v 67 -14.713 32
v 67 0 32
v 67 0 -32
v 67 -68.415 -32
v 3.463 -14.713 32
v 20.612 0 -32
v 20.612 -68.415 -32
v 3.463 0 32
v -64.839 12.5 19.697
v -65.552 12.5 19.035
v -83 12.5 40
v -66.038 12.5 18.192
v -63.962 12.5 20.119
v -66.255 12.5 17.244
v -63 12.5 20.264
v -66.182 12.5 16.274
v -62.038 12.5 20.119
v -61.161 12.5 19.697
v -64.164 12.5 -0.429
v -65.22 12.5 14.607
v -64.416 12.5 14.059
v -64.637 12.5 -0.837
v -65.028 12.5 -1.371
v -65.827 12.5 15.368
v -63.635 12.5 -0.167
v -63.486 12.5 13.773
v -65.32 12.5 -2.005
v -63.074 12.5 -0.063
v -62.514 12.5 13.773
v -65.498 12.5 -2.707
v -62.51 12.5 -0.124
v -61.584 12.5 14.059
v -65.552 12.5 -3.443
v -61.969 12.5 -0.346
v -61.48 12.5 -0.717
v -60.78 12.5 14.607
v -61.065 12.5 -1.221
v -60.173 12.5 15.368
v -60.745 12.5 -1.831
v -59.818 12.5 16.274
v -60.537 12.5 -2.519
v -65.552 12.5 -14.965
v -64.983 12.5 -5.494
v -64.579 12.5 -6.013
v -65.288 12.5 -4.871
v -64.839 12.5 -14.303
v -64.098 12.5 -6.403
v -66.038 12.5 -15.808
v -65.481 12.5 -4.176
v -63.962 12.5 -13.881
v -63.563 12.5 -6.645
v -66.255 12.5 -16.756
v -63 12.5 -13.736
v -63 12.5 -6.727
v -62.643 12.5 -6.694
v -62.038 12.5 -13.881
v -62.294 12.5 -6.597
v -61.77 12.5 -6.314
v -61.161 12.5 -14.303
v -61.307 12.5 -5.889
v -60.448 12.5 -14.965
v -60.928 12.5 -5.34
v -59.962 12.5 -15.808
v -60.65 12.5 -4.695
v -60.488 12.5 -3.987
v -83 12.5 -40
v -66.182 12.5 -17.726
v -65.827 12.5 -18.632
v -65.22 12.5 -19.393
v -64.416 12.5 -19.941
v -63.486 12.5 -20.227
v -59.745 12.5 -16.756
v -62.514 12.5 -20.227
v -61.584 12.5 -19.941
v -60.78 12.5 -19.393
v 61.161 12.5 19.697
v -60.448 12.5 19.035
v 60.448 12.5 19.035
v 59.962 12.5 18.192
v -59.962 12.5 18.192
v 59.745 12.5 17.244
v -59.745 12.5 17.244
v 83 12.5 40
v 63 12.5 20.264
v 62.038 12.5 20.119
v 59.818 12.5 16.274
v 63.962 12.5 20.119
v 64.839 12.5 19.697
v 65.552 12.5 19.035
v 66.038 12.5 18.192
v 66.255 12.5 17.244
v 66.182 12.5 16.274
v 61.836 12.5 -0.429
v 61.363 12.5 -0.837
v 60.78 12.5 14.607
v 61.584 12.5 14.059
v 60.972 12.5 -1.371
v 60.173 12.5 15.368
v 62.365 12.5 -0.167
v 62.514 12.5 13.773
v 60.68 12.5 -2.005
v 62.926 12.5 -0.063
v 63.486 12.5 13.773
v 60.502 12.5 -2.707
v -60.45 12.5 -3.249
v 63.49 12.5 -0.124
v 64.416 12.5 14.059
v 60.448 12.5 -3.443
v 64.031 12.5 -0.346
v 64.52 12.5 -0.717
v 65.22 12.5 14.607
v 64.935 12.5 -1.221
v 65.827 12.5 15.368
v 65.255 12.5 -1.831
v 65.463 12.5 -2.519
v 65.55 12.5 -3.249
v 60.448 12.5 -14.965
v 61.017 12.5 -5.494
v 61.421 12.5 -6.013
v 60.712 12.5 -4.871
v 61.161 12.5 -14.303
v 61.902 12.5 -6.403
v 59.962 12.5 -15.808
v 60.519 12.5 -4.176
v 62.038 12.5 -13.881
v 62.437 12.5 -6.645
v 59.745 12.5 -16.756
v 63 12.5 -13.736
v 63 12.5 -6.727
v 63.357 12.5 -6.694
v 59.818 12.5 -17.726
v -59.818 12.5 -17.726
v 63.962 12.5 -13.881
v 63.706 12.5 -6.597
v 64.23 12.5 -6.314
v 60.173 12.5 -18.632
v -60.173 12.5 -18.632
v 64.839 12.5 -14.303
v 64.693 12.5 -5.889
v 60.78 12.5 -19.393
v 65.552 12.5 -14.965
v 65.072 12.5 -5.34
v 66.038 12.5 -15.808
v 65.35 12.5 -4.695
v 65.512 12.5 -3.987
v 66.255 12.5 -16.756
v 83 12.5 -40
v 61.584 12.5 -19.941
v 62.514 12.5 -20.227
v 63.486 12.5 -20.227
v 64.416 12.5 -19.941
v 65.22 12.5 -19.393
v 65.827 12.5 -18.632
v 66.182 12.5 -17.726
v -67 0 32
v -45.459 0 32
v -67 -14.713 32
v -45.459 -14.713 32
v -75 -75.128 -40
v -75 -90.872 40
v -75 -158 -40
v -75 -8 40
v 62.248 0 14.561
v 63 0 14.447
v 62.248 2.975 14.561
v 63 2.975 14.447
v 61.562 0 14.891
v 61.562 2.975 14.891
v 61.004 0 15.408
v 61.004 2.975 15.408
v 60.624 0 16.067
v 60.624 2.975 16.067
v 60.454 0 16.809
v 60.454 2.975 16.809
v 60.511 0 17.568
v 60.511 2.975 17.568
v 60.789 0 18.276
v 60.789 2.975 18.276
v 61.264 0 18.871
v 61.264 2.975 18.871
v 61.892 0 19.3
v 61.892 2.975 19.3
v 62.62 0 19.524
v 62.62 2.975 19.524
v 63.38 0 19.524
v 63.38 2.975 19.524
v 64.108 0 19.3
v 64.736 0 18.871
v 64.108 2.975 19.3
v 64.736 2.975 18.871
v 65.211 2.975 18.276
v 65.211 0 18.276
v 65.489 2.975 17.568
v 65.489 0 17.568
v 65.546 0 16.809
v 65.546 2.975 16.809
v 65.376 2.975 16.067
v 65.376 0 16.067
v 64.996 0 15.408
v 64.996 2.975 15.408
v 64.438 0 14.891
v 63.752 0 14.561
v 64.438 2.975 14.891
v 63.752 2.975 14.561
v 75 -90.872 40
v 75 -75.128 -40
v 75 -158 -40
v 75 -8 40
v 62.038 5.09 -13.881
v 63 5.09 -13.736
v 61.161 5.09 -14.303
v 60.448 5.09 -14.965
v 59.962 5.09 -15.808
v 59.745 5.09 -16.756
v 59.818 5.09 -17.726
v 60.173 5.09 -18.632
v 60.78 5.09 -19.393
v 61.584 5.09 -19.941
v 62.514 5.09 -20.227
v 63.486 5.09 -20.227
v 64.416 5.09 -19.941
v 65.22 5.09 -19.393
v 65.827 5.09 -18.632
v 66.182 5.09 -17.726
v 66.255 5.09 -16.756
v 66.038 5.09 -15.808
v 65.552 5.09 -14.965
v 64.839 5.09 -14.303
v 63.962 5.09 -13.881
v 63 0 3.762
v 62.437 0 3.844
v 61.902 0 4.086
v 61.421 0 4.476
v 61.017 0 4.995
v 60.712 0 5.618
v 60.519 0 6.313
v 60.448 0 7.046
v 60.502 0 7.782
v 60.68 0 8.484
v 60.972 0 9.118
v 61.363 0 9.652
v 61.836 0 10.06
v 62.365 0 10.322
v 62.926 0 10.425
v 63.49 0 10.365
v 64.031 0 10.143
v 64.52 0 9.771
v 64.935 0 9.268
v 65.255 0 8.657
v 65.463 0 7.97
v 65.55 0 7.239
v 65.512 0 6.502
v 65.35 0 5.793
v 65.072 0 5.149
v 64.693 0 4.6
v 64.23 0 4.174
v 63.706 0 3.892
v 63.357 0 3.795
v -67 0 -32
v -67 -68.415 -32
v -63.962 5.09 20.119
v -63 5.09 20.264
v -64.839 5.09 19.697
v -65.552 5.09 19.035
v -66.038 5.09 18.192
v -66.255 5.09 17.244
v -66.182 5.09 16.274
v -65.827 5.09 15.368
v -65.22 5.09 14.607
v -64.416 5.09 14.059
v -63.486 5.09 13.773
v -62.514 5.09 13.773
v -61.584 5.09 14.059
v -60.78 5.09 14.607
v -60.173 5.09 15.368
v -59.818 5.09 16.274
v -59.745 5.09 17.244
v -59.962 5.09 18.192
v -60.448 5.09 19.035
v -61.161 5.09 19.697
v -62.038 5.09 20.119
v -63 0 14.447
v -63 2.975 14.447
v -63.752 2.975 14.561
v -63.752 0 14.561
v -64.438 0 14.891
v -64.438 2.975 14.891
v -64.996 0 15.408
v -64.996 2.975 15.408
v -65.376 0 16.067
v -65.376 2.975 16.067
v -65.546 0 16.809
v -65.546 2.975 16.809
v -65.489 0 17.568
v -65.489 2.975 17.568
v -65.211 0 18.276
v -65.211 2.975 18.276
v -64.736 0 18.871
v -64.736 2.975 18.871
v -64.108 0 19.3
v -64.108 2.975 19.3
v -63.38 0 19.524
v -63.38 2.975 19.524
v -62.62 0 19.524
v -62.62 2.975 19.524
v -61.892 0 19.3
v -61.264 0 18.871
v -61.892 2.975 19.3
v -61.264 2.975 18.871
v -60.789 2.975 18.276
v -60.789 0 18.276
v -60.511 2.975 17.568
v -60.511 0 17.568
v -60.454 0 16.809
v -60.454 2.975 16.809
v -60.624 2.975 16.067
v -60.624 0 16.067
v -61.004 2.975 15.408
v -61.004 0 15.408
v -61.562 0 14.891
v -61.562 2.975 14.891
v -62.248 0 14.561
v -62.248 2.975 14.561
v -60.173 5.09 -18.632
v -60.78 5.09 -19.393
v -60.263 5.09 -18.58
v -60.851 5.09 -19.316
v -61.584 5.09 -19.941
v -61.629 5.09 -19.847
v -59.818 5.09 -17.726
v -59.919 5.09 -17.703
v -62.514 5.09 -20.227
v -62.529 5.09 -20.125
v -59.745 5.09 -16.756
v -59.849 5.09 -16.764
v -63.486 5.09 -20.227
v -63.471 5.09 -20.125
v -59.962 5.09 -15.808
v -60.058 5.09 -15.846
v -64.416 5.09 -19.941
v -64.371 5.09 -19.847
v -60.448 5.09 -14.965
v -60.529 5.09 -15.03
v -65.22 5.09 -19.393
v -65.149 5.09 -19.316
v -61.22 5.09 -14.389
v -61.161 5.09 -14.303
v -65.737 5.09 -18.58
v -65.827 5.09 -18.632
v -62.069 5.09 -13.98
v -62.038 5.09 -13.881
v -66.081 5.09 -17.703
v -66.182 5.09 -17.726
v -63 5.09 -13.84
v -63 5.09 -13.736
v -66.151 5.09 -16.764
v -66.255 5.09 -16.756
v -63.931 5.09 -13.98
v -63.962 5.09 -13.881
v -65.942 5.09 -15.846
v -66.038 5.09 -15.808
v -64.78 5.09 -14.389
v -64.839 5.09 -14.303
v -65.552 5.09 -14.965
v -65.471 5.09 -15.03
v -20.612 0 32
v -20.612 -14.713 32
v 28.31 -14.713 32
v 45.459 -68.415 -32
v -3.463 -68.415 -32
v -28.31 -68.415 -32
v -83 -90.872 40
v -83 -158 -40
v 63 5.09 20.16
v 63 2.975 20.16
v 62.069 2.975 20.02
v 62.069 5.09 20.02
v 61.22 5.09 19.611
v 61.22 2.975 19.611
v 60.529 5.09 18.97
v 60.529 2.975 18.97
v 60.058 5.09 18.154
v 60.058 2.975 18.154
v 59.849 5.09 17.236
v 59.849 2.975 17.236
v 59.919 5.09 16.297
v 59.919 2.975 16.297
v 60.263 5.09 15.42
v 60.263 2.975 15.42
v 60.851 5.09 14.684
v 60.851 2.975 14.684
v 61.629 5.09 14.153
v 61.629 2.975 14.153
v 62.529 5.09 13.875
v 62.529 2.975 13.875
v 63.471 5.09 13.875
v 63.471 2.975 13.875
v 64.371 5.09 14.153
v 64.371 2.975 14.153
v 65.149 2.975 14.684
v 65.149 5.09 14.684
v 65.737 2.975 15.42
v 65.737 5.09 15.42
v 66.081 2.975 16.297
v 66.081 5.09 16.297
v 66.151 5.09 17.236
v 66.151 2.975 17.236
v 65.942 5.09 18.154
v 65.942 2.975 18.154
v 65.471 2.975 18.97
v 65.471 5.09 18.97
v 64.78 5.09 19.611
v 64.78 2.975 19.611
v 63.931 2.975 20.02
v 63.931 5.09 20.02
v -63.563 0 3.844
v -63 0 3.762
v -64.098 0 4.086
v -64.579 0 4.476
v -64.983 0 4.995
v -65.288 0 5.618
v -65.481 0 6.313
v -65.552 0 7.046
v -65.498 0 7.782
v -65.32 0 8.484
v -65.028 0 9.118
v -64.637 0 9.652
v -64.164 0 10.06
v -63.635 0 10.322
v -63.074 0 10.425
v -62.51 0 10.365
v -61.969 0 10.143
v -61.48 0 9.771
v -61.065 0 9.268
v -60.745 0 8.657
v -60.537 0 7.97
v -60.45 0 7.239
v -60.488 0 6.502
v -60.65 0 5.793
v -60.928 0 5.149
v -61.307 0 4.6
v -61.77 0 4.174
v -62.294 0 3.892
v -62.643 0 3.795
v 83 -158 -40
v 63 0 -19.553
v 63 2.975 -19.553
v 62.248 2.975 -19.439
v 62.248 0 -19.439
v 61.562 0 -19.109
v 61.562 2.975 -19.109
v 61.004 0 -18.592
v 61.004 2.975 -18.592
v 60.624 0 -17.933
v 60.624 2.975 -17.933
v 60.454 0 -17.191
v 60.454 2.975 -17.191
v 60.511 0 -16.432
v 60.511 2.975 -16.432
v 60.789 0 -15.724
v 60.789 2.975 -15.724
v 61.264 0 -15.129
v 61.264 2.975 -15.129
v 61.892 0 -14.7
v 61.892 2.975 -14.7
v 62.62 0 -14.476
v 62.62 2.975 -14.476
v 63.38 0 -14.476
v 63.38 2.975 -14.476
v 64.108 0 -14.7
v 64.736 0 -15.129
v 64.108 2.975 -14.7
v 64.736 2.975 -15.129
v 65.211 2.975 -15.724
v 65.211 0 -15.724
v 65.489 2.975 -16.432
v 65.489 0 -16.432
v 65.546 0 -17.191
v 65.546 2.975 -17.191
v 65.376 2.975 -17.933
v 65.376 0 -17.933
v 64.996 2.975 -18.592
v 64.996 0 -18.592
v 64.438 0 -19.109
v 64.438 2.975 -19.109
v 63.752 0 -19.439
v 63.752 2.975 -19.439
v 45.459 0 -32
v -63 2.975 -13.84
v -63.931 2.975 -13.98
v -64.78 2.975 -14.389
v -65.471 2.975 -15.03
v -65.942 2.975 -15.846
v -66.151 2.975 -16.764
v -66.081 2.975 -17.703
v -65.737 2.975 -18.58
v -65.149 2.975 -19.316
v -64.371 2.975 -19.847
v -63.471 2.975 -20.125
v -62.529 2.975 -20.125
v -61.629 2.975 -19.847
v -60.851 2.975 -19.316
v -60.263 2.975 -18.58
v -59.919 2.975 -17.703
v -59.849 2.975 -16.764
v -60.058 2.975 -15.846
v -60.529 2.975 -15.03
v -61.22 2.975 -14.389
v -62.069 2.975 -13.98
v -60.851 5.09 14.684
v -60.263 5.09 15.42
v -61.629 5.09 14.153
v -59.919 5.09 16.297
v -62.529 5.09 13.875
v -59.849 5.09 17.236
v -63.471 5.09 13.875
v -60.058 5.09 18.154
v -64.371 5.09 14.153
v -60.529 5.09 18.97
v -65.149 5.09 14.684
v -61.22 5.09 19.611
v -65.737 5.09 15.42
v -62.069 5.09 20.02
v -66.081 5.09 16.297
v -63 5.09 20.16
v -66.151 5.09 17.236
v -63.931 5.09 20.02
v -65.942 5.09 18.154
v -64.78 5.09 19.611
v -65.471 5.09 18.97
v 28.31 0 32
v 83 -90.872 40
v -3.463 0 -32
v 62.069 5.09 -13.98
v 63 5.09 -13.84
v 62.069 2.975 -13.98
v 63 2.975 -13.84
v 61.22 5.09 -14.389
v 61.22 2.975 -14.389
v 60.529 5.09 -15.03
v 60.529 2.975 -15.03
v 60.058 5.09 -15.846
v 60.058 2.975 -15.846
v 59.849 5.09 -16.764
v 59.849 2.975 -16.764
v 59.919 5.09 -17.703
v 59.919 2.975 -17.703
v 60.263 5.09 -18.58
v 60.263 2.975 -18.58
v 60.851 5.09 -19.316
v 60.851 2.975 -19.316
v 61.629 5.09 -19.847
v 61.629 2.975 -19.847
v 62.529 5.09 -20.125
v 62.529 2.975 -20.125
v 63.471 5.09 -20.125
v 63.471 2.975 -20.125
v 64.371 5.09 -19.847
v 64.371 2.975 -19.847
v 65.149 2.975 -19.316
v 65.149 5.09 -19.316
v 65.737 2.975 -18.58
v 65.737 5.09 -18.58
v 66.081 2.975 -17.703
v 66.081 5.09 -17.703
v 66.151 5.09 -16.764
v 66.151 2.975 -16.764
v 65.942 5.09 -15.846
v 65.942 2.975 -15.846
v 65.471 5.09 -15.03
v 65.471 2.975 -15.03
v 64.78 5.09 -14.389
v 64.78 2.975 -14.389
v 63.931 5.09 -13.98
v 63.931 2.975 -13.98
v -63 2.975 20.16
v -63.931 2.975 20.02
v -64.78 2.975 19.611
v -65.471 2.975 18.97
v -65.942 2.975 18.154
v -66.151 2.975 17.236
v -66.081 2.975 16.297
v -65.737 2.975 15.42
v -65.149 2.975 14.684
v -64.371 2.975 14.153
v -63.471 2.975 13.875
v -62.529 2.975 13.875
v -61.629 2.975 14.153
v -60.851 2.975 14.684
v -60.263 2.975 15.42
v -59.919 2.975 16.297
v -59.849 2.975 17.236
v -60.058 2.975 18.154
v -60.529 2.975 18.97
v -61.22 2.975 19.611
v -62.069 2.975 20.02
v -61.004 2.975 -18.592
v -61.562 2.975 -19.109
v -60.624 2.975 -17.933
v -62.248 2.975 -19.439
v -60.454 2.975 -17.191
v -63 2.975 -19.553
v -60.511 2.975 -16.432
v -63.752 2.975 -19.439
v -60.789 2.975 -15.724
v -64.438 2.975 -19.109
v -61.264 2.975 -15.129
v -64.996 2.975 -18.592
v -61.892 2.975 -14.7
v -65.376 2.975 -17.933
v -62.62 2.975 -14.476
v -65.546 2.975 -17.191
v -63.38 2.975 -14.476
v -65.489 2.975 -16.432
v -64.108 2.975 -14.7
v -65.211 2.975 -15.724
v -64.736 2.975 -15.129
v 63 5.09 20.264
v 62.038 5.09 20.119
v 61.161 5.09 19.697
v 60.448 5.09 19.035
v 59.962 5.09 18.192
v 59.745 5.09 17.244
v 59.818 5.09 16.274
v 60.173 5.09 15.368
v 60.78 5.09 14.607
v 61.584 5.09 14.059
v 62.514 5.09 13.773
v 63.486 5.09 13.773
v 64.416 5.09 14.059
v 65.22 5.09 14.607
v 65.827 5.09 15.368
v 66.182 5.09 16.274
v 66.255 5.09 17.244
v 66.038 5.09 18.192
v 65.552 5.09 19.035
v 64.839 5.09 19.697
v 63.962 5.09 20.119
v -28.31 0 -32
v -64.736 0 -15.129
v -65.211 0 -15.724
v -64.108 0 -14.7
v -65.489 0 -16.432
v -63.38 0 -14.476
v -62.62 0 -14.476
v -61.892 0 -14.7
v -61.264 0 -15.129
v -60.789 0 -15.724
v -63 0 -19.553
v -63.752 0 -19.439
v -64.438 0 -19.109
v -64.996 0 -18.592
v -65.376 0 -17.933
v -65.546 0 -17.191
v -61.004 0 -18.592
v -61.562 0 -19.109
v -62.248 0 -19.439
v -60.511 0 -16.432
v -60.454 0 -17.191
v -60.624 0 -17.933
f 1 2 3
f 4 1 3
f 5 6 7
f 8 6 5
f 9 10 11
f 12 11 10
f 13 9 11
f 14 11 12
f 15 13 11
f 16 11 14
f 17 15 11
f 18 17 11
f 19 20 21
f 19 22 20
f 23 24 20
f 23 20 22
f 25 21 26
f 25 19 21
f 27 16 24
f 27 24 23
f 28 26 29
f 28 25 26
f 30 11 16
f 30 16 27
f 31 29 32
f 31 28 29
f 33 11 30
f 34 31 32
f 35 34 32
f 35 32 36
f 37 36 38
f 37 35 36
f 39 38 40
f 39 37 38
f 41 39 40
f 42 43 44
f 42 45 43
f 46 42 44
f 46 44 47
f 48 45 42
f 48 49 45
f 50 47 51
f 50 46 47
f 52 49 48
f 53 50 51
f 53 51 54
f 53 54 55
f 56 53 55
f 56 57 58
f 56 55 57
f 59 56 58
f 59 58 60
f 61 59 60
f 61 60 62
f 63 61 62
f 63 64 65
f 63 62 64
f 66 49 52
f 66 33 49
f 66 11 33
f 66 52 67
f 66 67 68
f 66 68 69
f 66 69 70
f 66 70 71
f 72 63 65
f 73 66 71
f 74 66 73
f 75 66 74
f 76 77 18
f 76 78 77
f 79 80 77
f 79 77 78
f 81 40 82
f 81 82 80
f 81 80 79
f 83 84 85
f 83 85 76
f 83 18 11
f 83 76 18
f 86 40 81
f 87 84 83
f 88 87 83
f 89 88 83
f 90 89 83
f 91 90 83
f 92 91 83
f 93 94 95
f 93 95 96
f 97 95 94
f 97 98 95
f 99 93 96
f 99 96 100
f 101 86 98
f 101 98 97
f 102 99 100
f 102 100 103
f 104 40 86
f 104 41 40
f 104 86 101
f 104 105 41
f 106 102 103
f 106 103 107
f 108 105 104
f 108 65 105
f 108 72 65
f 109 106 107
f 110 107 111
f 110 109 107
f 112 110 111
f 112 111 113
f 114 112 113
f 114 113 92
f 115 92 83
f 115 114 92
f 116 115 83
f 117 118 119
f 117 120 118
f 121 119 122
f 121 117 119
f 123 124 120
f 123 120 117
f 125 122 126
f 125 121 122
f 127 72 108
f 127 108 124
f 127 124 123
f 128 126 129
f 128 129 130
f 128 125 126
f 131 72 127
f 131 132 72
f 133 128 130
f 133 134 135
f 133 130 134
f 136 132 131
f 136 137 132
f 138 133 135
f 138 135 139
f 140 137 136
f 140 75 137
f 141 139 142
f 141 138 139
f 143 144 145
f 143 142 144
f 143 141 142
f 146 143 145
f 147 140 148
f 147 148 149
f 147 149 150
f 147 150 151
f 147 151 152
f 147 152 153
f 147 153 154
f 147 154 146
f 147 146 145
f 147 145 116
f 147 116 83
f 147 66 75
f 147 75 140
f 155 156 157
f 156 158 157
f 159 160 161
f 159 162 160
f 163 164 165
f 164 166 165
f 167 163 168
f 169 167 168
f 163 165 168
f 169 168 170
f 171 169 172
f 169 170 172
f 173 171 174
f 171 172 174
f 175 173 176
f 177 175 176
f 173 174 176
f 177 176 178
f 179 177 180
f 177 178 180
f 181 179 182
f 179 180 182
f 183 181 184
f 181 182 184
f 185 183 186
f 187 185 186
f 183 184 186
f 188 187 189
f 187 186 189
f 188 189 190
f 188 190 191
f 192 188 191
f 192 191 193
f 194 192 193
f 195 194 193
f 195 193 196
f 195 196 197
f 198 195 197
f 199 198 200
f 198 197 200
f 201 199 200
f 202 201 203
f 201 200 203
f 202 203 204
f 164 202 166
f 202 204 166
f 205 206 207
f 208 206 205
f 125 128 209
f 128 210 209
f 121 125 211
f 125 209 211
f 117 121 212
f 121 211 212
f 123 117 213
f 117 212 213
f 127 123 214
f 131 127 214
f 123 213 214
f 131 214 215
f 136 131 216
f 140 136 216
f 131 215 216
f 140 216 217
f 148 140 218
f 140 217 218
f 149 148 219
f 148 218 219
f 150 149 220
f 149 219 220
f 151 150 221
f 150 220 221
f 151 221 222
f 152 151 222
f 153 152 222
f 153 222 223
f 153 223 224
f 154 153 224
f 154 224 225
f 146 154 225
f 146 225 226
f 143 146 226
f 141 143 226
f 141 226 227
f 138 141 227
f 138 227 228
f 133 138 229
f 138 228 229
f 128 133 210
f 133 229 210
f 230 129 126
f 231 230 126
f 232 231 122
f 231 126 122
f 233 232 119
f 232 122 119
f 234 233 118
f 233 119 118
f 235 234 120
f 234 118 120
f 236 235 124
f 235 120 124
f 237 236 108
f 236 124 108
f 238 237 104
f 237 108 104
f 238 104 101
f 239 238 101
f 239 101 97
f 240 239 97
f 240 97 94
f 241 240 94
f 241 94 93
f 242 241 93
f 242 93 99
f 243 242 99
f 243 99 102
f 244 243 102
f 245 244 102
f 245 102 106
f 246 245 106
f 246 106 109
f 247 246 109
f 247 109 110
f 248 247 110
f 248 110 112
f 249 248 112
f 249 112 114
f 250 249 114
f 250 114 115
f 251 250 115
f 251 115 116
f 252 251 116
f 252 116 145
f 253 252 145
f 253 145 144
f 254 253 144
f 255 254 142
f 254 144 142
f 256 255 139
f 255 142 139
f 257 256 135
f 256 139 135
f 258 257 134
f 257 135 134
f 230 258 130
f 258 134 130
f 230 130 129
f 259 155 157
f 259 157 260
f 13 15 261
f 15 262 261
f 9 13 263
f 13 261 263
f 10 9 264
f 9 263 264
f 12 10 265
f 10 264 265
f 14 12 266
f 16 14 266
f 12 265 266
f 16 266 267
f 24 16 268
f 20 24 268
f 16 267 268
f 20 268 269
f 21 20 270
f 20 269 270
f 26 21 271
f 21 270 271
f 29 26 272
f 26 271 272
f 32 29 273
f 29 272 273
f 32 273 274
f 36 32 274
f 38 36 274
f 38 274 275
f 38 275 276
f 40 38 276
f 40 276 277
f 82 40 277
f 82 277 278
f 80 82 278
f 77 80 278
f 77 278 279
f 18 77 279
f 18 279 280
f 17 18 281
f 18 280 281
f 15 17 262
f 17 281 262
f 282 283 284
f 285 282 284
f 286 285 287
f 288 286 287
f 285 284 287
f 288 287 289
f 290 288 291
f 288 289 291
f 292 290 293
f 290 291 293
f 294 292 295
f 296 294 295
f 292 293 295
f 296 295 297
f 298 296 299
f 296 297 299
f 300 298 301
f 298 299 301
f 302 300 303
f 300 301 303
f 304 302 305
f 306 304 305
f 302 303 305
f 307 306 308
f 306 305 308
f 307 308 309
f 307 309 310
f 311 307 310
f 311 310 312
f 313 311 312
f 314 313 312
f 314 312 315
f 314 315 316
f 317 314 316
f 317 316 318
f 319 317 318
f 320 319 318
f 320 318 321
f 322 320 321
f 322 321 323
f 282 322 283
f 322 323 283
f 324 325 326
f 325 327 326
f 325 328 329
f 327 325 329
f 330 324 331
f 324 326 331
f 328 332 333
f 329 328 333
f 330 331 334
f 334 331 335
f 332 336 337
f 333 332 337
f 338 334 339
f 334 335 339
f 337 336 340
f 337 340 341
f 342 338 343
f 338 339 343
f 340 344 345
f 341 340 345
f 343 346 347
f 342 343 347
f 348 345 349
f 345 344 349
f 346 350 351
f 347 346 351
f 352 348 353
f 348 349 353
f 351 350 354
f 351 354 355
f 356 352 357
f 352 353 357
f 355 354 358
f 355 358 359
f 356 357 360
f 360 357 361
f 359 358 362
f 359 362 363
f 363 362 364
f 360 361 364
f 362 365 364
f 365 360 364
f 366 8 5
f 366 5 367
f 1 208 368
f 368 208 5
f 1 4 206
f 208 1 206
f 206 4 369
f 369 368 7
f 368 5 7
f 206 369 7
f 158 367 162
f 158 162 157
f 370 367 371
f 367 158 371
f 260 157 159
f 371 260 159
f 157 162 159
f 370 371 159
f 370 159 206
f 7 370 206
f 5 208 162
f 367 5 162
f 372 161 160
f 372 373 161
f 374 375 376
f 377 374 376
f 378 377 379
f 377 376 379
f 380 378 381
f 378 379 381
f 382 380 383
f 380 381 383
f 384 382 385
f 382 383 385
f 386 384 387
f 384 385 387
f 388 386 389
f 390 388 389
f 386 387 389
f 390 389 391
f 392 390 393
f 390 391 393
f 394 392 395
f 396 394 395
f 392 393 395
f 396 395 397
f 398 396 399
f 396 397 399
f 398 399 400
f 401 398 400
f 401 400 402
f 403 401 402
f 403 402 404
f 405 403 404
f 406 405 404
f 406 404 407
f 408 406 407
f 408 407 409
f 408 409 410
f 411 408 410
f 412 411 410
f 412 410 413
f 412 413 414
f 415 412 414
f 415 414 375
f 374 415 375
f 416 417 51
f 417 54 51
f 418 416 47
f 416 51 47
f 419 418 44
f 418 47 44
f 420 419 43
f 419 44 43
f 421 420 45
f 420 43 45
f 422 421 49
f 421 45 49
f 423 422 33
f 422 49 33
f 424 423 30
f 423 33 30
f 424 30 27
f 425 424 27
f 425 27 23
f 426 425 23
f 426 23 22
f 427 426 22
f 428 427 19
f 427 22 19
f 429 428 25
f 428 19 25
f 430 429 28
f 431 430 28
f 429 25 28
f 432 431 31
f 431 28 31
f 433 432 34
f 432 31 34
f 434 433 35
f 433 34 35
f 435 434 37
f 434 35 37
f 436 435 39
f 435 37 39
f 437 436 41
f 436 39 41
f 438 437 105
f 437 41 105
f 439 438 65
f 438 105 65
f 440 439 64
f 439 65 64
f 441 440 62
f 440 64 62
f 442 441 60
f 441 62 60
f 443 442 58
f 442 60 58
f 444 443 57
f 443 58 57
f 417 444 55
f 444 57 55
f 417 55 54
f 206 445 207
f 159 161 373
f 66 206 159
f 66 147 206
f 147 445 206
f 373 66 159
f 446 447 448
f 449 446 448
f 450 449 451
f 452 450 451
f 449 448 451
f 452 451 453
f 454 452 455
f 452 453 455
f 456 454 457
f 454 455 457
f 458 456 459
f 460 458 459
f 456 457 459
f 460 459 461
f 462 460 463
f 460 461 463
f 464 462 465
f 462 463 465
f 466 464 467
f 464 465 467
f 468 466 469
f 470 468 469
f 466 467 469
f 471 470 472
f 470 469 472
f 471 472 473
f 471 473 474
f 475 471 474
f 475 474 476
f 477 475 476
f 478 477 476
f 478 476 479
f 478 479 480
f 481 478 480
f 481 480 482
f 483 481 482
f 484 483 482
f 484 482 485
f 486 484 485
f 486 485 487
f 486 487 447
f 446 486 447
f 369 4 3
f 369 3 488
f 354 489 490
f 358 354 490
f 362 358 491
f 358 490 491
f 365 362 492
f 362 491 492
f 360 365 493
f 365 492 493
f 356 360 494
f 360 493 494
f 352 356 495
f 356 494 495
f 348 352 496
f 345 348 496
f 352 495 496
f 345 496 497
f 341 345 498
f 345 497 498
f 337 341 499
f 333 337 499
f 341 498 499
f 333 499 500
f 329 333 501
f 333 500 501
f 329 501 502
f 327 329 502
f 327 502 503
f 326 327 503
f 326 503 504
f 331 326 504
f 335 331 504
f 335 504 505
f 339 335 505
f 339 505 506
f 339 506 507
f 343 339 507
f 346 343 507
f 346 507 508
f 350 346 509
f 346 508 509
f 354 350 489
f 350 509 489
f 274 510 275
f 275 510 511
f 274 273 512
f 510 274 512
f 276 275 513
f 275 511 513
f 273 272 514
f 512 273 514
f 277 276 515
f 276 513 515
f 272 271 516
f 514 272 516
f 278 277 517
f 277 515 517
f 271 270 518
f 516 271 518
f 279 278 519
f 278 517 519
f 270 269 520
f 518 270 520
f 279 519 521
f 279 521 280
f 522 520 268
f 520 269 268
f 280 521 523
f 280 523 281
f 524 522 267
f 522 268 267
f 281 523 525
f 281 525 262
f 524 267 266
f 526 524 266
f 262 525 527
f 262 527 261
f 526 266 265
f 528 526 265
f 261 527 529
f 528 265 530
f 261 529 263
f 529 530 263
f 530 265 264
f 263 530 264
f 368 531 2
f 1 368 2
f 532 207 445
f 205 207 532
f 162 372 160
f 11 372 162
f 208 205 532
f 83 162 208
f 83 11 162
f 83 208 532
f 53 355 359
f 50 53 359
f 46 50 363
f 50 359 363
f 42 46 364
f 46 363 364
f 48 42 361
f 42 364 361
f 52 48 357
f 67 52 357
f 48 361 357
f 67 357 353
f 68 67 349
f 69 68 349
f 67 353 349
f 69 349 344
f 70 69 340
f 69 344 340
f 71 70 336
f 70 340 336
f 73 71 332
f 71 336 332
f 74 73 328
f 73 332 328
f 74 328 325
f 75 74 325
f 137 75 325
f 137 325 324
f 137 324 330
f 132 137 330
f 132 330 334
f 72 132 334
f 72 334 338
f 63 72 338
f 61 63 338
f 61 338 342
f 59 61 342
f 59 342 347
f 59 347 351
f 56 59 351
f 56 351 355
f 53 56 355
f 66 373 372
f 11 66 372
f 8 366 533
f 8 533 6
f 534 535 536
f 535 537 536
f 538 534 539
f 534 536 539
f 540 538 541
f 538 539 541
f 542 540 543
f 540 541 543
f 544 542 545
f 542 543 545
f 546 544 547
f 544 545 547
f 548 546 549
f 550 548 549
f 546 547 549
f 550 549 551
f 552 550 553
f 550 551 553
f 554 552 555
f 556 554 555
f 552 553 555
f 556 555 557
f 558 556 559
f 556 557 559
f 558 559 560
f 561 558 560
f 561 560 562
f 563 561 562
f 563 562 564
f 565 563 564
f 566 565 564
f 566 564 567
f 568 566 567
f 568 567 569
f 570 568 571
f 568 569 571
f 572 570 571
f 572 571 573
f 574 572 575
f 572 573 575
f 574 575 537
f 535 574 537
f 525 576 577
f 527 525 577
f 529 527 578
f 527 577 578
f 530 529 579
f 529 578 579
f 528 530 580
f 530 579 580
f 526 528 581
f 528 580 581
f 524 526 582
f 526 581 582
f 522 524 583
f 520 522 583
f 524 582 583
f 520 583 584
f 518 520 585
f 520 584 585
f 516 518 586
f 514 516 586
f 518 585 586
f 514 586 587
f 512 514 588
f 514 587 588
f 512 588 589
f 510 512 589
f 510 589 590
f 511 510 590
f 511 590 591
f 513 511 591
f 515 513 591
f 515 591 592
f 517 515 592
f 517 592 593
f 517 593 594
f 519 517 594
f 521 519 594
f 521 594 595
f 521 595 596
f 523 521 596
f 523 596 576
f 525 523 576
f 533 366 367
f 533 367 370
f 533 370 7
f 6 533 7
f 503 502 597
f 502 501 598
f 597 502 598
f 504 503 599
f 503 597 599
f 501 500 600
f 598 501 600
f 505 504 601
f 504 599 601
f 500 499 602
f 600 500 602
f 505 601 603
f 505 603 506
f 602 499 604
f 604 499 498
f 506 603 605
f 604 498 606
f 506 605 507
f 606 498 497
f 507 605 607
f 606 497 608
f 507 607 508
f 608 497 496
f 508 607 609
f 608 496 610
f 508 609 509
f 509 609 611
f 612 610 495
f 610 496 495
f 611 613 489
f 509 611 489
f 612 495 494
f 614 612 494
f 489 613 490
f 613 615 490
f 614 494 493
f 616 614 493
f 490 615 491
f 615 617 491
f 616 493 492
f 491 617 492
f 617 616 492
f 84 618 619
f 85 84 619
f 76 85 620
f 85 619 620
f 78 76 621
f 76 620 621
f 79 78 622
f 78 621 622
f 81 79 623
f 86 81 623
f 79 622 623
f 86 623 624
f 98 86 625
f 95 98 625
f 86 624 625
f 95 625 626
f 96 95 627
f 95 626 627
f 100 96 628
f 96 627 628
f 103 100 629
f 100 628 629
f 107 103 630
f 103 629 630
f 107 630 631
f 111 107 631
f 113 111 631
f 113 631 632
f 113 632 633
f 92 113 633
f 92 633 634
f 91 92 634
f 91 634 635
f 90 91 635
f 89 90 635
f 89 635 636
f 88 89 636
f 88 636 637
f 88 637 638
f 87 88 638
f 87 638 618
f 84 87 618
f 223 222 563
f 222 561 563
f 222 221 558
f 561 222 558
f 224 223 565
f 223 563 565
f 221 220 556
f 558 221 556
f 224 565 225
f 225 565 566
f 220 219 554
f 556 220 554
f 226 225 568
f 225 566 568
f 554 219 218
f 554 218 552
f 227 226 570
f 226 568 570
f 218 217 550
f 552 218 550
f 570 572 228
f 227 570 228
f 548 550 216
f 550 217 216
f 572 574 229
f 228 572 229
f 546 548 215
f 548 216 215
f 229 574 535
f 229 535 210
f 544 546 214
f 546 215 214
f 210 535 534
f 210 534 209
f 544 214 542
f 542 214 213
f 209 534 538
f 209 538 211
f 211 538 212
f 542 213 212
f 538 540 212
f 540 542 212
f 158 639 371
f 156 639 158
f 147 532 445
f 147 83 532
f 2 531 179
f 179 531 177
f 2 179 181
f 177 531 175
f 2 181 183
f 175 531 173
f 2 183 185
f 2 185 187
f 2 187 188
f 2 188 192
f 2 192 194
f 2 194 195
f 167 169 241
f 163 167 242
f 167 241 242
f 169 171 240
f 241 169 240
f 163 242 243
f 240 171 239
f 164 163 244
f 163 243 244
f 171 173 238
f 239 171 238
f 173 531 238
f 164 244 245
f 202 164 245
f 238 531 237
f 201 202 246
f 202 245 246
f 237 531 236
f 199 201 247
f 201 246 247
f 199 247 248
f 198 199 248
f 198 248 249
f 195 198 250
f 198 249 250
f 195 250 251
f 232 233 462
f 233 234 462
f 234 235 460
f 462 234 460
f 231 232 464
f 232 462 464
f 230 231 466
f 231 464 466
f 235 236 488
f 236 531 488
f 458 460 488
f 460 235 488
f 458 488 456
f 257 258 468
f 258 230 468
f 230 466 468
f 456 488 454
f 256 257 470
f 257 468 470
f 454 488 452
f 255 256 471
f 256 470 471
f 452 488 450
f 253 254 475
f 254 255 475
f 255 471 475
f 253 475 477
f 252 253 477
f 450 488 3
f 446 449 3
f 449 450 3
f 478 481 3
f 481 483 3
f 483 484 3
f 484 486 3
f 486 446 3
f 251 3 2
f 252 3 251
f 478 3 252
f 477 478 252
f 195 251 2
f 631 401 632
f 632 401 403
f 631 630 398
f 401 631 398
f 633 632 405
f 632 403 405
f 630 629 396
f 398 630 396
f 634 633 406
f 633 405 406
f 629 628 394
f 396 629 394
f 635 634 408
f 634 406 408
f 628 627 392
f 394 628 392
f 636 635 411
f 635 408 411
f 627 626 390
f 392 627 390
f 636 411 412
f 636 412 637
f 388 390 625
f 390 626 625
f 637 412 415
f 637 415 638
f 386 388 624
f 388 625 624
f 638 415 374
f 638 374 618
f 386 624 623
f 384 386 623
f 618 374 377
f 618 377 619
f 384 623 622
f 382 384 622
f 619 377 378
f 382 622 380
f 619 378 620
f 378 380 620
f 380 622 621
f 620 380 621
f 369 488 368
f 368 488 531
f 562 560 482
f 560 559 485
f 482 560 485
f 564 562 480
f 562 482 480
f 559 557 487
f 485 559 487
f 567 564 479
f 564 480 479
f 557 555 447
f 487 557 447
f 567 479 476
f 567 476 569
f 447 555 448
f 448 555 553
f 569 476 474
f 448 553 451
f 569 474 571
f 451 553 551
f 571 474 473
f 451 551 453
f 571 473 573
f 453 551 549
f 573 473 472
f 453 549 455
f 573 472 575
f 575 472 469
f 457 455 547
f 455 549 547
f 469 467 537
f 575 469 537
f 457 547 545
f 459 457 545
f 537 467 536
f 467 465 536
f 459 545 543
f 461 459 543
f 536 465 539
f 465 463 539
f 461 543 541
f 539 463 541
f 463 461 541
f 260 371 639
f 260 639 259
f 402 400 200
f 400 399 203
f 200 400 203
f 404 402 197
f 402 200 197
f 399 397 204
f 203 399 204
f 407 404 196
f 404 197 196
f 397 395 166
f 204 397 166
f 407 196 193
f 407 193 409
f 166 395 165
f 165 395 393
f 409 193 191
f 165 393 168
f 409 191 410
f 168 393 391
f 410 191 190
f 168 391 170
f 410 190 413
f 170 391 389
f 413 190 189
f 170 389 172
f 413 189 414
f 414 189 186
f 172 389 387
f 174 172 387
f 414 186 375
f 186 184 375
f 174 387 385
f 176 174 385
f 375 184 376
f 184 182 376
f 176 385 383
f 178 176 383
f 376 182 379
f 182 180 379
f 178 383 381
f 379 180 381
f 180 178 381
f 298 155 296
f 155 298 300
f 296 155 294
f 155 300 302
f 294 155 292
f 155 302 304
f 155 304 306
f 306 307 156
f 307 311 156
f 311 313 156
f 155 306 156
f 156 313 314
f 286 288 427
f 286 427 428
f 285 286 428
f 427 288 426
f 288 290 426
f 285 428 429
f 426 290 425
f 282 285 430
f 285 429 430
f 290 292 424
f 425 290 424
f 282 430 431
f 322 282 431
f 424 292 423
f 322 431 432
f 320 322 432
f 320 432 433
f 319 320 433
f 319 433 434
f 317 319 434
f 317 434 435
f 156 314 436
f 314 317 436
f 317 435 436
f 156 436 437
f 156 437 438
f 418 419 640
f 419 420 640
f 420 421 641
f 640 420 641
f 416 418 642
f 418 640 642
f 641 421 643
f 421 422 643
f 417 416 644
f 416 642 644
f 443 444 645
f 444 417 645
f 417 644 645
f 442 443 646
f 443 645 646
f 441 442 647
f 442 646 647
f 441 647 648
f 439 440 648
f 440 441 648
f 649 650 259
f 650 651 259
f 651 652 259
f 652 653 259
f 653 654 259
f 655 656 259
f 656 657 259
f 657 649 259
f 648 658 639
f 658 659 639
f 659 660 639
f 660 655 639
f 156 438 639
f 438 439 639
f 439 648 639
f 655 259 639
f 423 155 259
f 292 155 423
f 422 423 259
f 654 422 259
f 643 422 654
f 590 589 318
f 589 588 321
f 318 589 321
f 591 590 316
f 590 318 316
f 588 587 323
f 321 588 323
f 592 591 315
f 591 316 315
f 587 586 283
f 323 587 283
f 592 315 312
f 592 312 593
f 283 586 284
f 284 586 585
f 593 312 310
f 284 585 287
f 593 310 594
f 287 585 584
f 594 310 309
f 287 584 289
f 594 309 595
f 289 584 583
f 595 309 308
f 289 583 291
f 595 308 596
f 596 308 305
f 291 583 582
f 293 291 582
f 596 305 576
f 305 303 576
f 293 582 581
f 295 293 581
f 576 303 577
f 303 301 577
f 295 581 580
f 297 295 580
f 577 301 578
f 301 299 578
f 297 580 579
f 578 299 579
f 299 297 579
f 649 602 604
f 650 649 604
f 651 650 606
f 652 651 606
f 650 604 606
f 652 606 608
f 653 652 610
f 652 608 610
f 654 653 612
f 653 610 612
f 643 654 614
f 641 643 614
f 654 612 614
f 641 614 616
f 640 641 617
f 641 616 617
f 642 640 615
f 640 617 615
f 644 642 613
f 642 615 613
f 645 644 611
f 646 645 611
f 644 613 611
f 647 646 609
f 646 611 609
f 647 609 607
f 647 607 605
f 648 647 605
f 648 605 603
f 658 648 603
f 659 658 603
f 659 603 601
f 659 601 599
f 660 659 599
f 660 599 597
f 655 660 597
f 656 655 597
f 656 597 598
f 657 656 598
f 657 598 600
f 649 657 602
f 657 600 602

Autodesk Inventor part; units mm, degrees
ref_plane "XZ Plane" through (0, 0, 0) normal (0, 1, 0) x (-1, 0, 0)
ref_plane "XY Plane" through (0, 0, 0) normal (0, 0, 1) x (1, 0, 0)
sketch "Sketch8" plane through (0, 0, 0) normal (0, 1, 0) x (-1, 0, 0)
  line L0 (83, 40) -> (-83, 40)
  line L1 (-83, 40) -> (-83, -40)
  line L2 (-83, -40) -> (83, -40)
  line L3 (83, -40) -> (83, 40)
  line L4 (83, 40) -> (-83, -40) construction
  line L5 (-83, 40) -> (83, -40) construction
  point P0 (0, 0)
  dimension "d28" = 80
  dimension "d29" = 166
extrude "Extrusion8" add sketch "Sketch8" against normal blind 8
sketch "Sketch9" plane through (0, -8, 0) normal (0, -1, 0) x (1, 0, 0)
  line L0 (83, 40) -> (-83, 40) projected
  line L1 (-83, -40) -> (83, -40) projected
  line L2 (-83, 40) -> (-75, 40)
  line L3 (-75, 40) -> (-75, -40)
  line L4 (-75, -40) -> (-83, -40)
  line L5 (-83, -40) -> (-83, 40)
  line L6 (83, -40) -> (83, 40) projected
  line L7 (83, -40) -> (75, -40)
  line L8 (75, -40) -> (75, 40)
  line L9 (75, 40) -> (83, 40)
  line L10 (83, 40) -> (83, -40)
  point P0 (0, 0)
  point P1 (75, 40)
  point P2 (75, -40)
  dimension "d32" = 8
  dimension "d33" = 8
extrude "armsForCameraCase" add sketch "Sketch9" along normal blind 150 contours L6 L1 L8 L0 | L3 L1 L5 L0
sketch "Sketch10" plane through (-75, -8, 40) normal (1, 0, 0) x (0, 0, -1)
  line L0 (0, 0) -> (80, 0) projected
  line L1 (80, 0) -> (80, -150) projected
  line L2 (80, -150) -> (0, -150) projected
  line L3 (0, 0) -> (0, -150) projected
  line L4 (0, 0) -> (80, -67.128)
  line L5 (80, -67.128) -> (80, 0)
  line L6 (80, 0) -> (0, 0)
  point P0 (40, 8)
  point P1 (40, -33.564)
  dimension "d48" = 40
extrude "Extrusion10" add sketch "Sketch10" along normal up to surface (150 mm away) contours L0 L1 L4
sketch "Sketch11" plane through (0, 0, 0) normal (0, 1, 0) x (1, 0, 0)
  line L0 (83, 40) -> (-83, 40) projected
  line L1 (-83, -40) -> (83, -40) projected
  line L2 (-83, 40) -> (-83, -40) projected
  line L3 (83, -40) -> (83, 40) projected
  line L4 (-31.038, -40) -> (-9.602, 40)
  line L5 (-9.602, 40) -> (-17.8842, 40)
  line L6 (-75, 40) -> (75, 40) projected
  line L7 (-17.8842, 40) -> (-39.3202, -40)
  line L8 (-39.3202, -40) -> (-31.038, -40)
  line L9 (-31.038, -40) -> (-31.038, 40) construction
  line L10 (0, -40) -> (0, 40) construction
  line L11 (9.602, -40) -> (31.038, 40)
  line L12 (31.038, 40) -> (39.3202, 40)
  line L13 (39.3202, 40) -> (17.8842, -40)
  line L14 (17.8842, -40) -> (9.602, -40)
  point P0 (0, 0)
  point P1 (0, -40)
  point P2 (0, -40)
  point P3 (-20.32, 0)
  point P4 (0, 0)
  point P5 (20.32, 0)
  point P6 (39.3202, 40)
  point P7 (31.038, 40)
  point P8 (-17.8842, 40)
  dimension "d39" = -15
  dimension "d40" = 8
  dimension "d42" = 8
  dimension "d44" = 20.32
  dimension "d45" = 20.32
extrude "Extrusion11" add sketch "Sketch11" along normal blind 104.1375 contours L13 L1 L11 L0 | L4 L1 L7 L0
sketch "Sketch12" plane through (0, 0, 0) normal (0, 1, 0) x (1, 0, 0)
  line L0 (31.038, 40) -> (-9.602, 40) projected
  line L1 (31.038, 40) -> (9.602, -40) projected
  line L2 (-31.038, -40) -> (9.602, -40) projected
  line L3 (-31.038, -40) -> (-9.602, 40) projected
  line L4 (-9.602, 40) -> (31.038, 40)
  line L5 (31.038, 40) -> (9.602, -40)
  line L6 (9.602, -40) -> (-31.038, -40)
  line L7 (-9.602, 40) -> (-31.038, -40) projected
  line L8 (-31.038, -40) -> (-9.602, 40)
  point P0 (0, 0)
extrude "Extrusion12" add sketch "Sketch12" along normal blind 20
sketch "Sketch13" plane through (-83, 0, -40) normal (-1, 0, 0) x (0, 0, 1)
  line L0 (0, -75.128) -> (80, -8) projected
  line L1 (80, 0) -> (80, -158) projected
  line L2 (80, -158) -> (0, -158) projected
  line L3 (0, 0) -> (0, -158) projected
  line L4 (80, -158) -> (0, -158) construction
  line L5 (40, -158) -> (40, -41.564) construction
  line L6 (80, -8) -> (0, -75.128) construction
  line L7 (0, -205.6687) -> (80, -138.5407) construction
  line L8 (80, -8) -> (80, -158) construction
  point P0 (40, 0)
  point P1 (40, -172.1047)
  point P2 (20, -188.8867)
  point P3 (60, -155.3227)
  dimension "centerForTwoHoles" = 26.1081
  dimension "d51" = 100
  dimension "diagonalLine" = 104.4326
  dimension "d62" = 26.1081
  dimension "d63" = 26.1081
hole "HolesForAttchingToLowerCase" at (-83, -172.1047, 0) at (-83, -188.8867, -20) at (-83, -155.3227, 20) direction (1, 0, 0) diameter 6.7564 end through all clearance for "Hex Machine Screw" size "1/4" standard "Ansi Unified Screw Threads"
sketch "Sketch14" plane through (-83, 0, -40) normal (-1, 0, 0) x (0, 0, 1)
  line L0 (80, 0) -> (80, -158) projected
  line L1 (80, -158) -> (0, -158) projected
  line L2 (0, 0) -> (0, -158) projected
  line L3 (0, -75.128) -> (80, -8) projected
  line L4 (0, -75.128) -> (0, -158) projected
  line L5 (0, -158) -> (80, -90.872)
  line L6 (0, -158) -> (80, -158) projected
  line L7 (0, -158) -> (80, -158)
  line L8 (80, -158) -> (80, -90.872)
  point P0 (40, 0)
extrude "Extrusion13" cut sketch "Sketch14" against normal through all contours L0 L1 L5
sketch "Sketch15" plane through (-39.3202, 0, 40) normal (-0.9659258, 0, -0.258819) x (-0.258819, 0, 0.9659258)
  line L0 (-82.8221, 104.1375) -> (0, 104.1375) projected
  line L1 (0, 0) -> (0, 104.1375) projected
  line L2 (-82.8221, 0) -> (-82.8221, 104.1375) projected
  line L3 (-2.1436, 20) -> (-84.9657, 20) projected
  line L4 (-82.8221, 40) -> (0, 40) construction
  line L5 (-57.8221, 40) -> (-57.8221, 104.1375) construction
  point P0 (-48.8138, 0)
  point P1 (-82.8221, 52.0688)
  point P2 (-37.8221, 40)
  point P3 (-17.8221, 40)
  point P4 (-57.8221, 60)
  point P5 (-37.8221, 60)
  point P6 (-17.8221, 60)
  point P7 (-57.8221, 80)
  point P8 (-37.8221, 80)
  point P9 (-17.8221, 80)
  dimension "d64" = 25
  dimension "d74" = 20
  dimension "d77" = 20
  dimension "d90" = 20
hole "HoleForLeftSideOf2x4" at (-24.3547, 40, -15.8519) at (-29.5311, 40, 3.4667) at (-34.7075, 40, 22.7852) at (-29.5311, 60, 3.4667) at (-24.3547, 60, -15.8519) at (-34.7075, 60, 22.7852) at (-34.7075, 80, 22.7852) at (-29.5311, 80, 3.4667) at (-24.3547, 80, -15.8519) direction (0.9659258, 0, 0.258819) diameter 4.496 depth 8 countersink diameter 8.433 countersink angle 82 clearance for "Flat Head Machine Screw (82)" size "#8" standard "Ansi Unified Screw Threads"
sketch "Sketch16" plane through (39.3202, 0, -40) normal (0.9659258, 0, 0.258819) x (0.258819, 0, -0.9659258)
  line L0 (-82.8221, 104.1375) -> (0, 104.1375) projected
  line L1 (0, 0) -> (0, 104.1375) projected
  line L2 (-82.8221, 0) -> (-82.8221, 104.1375) projected
  line L3 (-82.8221, 0) -> (-65.9689, 0) projected
  line L4 (-2.1436, 20) -> (-84.9657, 20) projected
  line L5 (-82.8221, 40) -> (0, 40) construction
  line L6 (-67.8221, 40) -> (-67.8221, 104.1375) construction
  point P0 (-48.8138, 0)
  point P1 (-47.8221, 40)
  point P2 (-27.8221, 40)
  point P3 (-67.8221, 60)
  point P4 (-47.8221, 60)
  point P5 (-27.8221, 60)
  point P6 (-67.8221, 80)
  point P7 (-47.8221, 80)
  point P8 (-27.8221, 80)
  dimension "d80" = 20
  dimension "d81" = 15
  dimension "d84" = 20
  dimension "d87" = 20
hole "HolesForRightSideOf2x4" at (26.9429, 40, 6.1926) at (32.1193, 40, -13.1259) at (21.7665, 60, 25.5111) at (26.9429, 60, 6.1926) at (32.1193, 60, -13.1259) at (21.7665, 80, 25.5111) at (26.9429, 80, 6.1926) at (32.1193, 80, -13.1259) at (21.7665, 40, 25.5111) direction (-0.9659258, 0, -0.258819) diameter 4.496 depth 8 countersink diameter 8.433 countersink angle 82 clearance for "Flat Head Machine Screw (82)" size "#8" standard "Ansi Unified Screw Threads"
sketch "Sketch17" plane through (0, 20, 0) normal (0, 1, 0) x (1, 0, 0)
  line L0 (31.038, 40) -> (9.602, -40) projected
  line L1 (-31.038, -40) -> (9.602, -40) projected
  line L2 (-31.038, -40) -> (-9.602, 40) projected
  line L3 (31.038, 40) -> (-9.602, 40) projected
  line L4 (20.6122, 32) -> (3.4634, -32)
  line L5 (3.4634, -32) -> (-20.6122, -32)
  line L6 (-20.6122, -32) -> (-3.4634, 32)
  line L7 (-3.4634, 32) -> (20.6122, 32)
  point P0 (0, 0)
  point P1 (10.718, 40)
  point P2 (-8.5744, -32)
  dimension "d98" = 8
  dimension "d99" = 8
  dimension "d101" = 8
  dimension "d102" = 8
extrude "Extrusion14" cut sketch "Sketch17" against normal through all contours L4 L5 L6 L7
sketch "Sketch18" plane through (0, 0, 0) normal (0, 1, 0) x (1, 0, 0)
  line L0 (17.8842, -40) -> (83, -40) projected
  line L1 (17.8842, -40) -> (39.3202, 40) projected
  line L2 (83, 40) -> (39.3202, 40) projected
  line L3 (83, -40) -> (83, 40) projected
  line L4 (67, -32) -> (67, 32)
  line L5 (67, 32) -> (45.4588, 32)
  line L6 (45.4588, 32) -> (28.31, -32)
  line L7 (28.31, -32) -> (67, -32)
  line L8 (39.3202, 40) -> (17.8842, -40) projected
  line L9 (17.8842, -40) -> (83, -40) projected
  line L10 (83, -40) -> (83, 40) projected
  line L11 (83, 40) -> (39.3202, 40) projected
  point P0 (0, 0)
  dimension "d105" = 8
  dimension "d107" = 8
  dimension "d108" = 16
  dimension "d109" = 8
extrude "Extrusion15" cut sketch "Sketch18" against normal through all contours L7 L6 L5 L4
sketch "Sketch19" plane through (0, 0, 0) normal (0, 1, 0) x (1, 0, 0)
  line L0 (-17.8842, 40) -> (-39.3202, -40) projected
  line L1 (-83, -40) -> (-39.3202, -40) projected
  line L2 (-83, 40) -> (-83, -40) projected
  line L3 (-17.8842, 40) -> (-83, 40) projected
  line L4 (-28.31, 32) -> (-45.4588, -32)
  line L5 (-45.4588, -32) -> (-67, -32)
  line L6 (-67, -32) -> (-67, 32)
  line L7 (-67, 32) -> (-28.31, 32)
  point P0 (0, 0)
  point P1 (-61.1601, -40)
  dimension "d112" = 8
  dimension "d113" = 16
  dimension "d114" = 8
  dimension "d115" = 8
extrude "Extrusion16" cut sketch "Sketch19" against normal through all contours L4 L5 L6 L7
sketch "Sketch27" plane through (-75, -8, 40) normal (0, 0, 1) x (1, 0, 0)
  line L0 (92.8842, 8) -> (158, 8) projected
  line L1 (92.8842, 8) -> (92.8842, 112.1375) projected
  line L2 (158, 8) -> (158, -82.872) projected
  line L3 (92.8842, 38) -> (158, 8)
  line L4 (158, 8) -> (92.8842, 8)
  line L5 (92.8842, 8) -> (92.8842, 38)
  point P0 (75, 8)
  dimension "d152" = 30
sketch "Sketch28" plane through (67, 0, 32) normal (0, 0, -1) x (-1, 0, 0)
  line L0 (-16, 0) -> (47.9394, 0)
  line L1 (49.1158, 0) -> (49.1158, 104.1375) projected
  line L2 (47.9394, 0) -> (47.9394, 30)
  line L3 (47.9394, 30) -> (-16, 0)
  point P0 (67, 0)
  dimension "d153" = 30
loft "Loft5" add profiles "Sketch27", "Sketch28"
sketch "Sketch29" plane through (75, -75.128, -40) normal (0, 0, -1) x (-1, 0, 0)
  line L0 (-8, 75.128) -> (35.6798, 75.128) projected
  line L1 (35.6798, 75.128) -> (35.6798, 179.2655) projected
  line L2 (-8, 75.128) -> (-8, -15.7441) projected
  line L3 (-8, 75.128) -> (35.6798, 75.128)
  line L4 (35.6798, 75.128) -> (35.6798, 105.128)
  line L5 (35.6798, 105.128) -> (-8, 75.128)
  point P0 (75, 75.128)
  dimension "d158" = 30
sketch "Sketch30" plane through (45.4588, 0, -32) normal (0, 0, 1) x (1, 0, 0)
  line L0 (-6.1386, 0) -> (-6.1386, 104.1375) projected
  line L1 (37.5412, 0) -> (-6.1386, 0) projected
  line L2 (-6.1386, 0) -> (-6.1386, 104.1375) projected
  line L3 (-6.1386, 0) -> (37.5412, 0)
  line L4 (37.5412, 0) -> (-6.1386, 30)
  line L5 (-6.1386, 30) -> (-6.1386, 0)
  point P0 (-45.4588, 0)
  dimension "d159" = 30
loft "Loft6" add profiles "Sketch29", "Sketch30"
sketch "Sketch31" plane through (-75, -8, 40) normal (0, 0, 1) x (1, 0, 0)
  line L0 (-8, 8) -> (35.6798, 8) projected
  line L1 (35.6798, 8) -> (35.6798, 112.1375) projected
  line L2 (57.1158, 8) -> (-8, 8) projected
  line L3 (-8, 8) -> (35.6798, 8)
  line L4 (35.6798, 8) -> (35.6798, 47)
  line L5 (35.6798, 47) -> (-8, 8)
  point P0 (75, 8)
  dimension "d164" = 39
sketch "Sketch32" plane through (-45.4588, 0, 32) normal (0, 0, -1) x (-1, 0, 0)
  line L0 (37.5412, 0) -> (-6.1386, 0) projected
  line L1 (37.5412, 0) -> (-8.7458, 0)
  line L2 (-8.7458, 0) -> (-8.7458, 30)
  line L3 (-8.7458, 30) -> (37.5412, 0)
  point P0 (-45.4588, 0)
  dimension "d165" = 30
loft "Loft7" add profiles "Sketch31", "Sketch32"
sketch "Sketch33" plane through (75, -75.128, -40) normal (0, 0, -1) x (-1, 0, 0)
  line L0 (92.8842, 75.128) -> (158, 75.128) projected
  line L1 (92.8842, 75.128) -> (92.8842, 179.2655) projected
  line L2 (112.1766, 75.128) -> (92.8842, 75.128) projected
  line L3 (92.8842, 75.128) -> (158, 75.128)
  line L4 (158, 75.128) -> (92.8842, 105.128)
  line L5 (92.8842, 105.128) -> (92.8842, 75.128)
  point P0 (75, 75.128)
  dimension "d171" = 30
sketch "Sketch34" plane through (-67, 0, -32) normal (0, 0, 1) x (1, 0, 0)
  line L0 (49.1158, 0) -> (-16, 0) projected
  line L1 (49.1158, 0) -> (49.1158, 104.1375) projected
  line L2 (-16, 0) -> (50.0262, 0)
  line L3 (29.8234, 0) -> (49.1158, 0) projected
  line L4 (50.0262, 0) -> (50.0262, 30)
  line L5 (50.0262, 30) -> (-16, 0)
  point P0 (67, 0)
  dimension "d170" = 30
loft "Loft8" add profiles "Sketch33", "Sketch34"
split "Split3" plane through (0, 0, 0) removes the side toward (0, 1, 0)
sketch "Sketch37" plane through (0, 0, 0) normal (0, 1, 0) x (1, 0, 0)
  line L0 (-83, 40) -> (83, 40) projected
  line L1 (83, -40) -> (83, 40) projected
  line L2 (83, -40) -> (-83, -40) projected
  line L3 (-83, 40) -> (-83, -40) projected
  line L4 (-82, -40) -> (82, -40)
  line L5 (82, -40) -> (82, 40)
  line L6 (82, 40) -> (-82, 40)
  line L7 (-82, 40) -> (-82, -40)
  line L8 (-82, -40) -> (82, 40) construction
  line L9 (82, -40) -> (-82, 40) construction
  point P0 (0, 0)
extrude "ExtrusionForMatingUpperHalf" add sketch "Sketch37" along normal blind 12.5
sketch "Sketch38" plane through (0, 0, 0) normal (0, -1, 0) x (1, 0, 0)
  point P0 (-63, -17)
  point P1 (63, -17)
  point P2 (63, 17)
  point P3 (-63, 17)
hole "HoleForNumber10Screws" at (-63, 0, -17) at (63, 0, -17) at (63, 0, 17) at (-63, 0, 17) direction (0, 1, 0) diameter 5.1054 end through all
sketch "SketchForHeatSetInserts" plane through (0, 12.5, 0) normal (0, 1, 0) x (1, 0, 0)
  circle A0 centre (-63, 17) radius 2.5527 construction
  circle A1 centre (63, -17) radius 2.5527 construction
  line L0 (-63, 17) -> (63, 17) construction
  line L1 (63, 17) -> (63, -17) construction
  line L2 (63, -17) -> (-63, -17) construction
  line L3 (-63, -17) -> (-63, 17) construction
  circle A2 centre (63, 17) radius 2.5527 projected
  point P0 (0, 0)
hole "HoleForInserts" at (-63, 12.5, -17) at (63, 12.5, -17) at (63, 12.5, 17) at (-63, 12.5, 17) direction (0, -1, 0) diameter 6.32 depth 9.525 counterbore diameter 6.5278 counterbore depth 7.41
sketch "Sketch42" plane through (-75, -8, 40) normal (0, -0.7660444, 0.6427876) x (1, 0, 0)
  line L0 (-8, 13.1771) -> (158, 13.1771) projected
  line L1 (0, -104.4326) -> (150, -104.4326) projected
  ellipse E0 centre (138, -12.4767) end of major axis (140.5527, -12.4767) minor radius 1.9555 projected
  ellipse E1 centre (138, -38.5222) end of major axis (140.5527, -38.5222) minor radius 1.9555 projected
  ellipse E2 centre (12, -12.4767) end of major axis (14.5527, -12.4767) minor radius 1.9555 projected
  ellipse E3 centre (12, -38.5222) end of major axis (14.5527, -38.5222) minor radius 1.9555 projected
  line L2 (138, 13.1771) -> (138, -104.4326) construction
  line L3 (12, 13.1771) -> (12, -104.4326) construction
  point P0 (75, -25.4995)
  point P1 (138, -20.0649)
  point P2 (12, -20.0649)
  dimension "d210" = 33.242
  dimension "d211" = 33.242
hole "Hole8" at (63, -20.8974, 24.6294) at (-63, -20.8974, 24.6294) direction (0, 0.7660444, -0.6427876) diameter 5.1054 depth 50 clearance for "Hex Machine Screw" size "#10" standard "Ansi Unified Screw Threads"
equation "\"d28\" = widthOfBracket"
equation "\"d30\" = wallThickness"
equation "\"d32\" = wallThickness"
equation "\"d33\" = wallThickness"
equation "\"d48\" = elevation"
equation "\"d39\" = azimuth"
equation "\"d40\" = wallThickness"
equation "\"d42\" = wallThickness"
equation "\"d44\" = 0.5 * twoByFourWidth"
equation "\"d45\" = 0.5 * twoByFourWidth"
equation "\"d46\" = twoByFourDepth + baseBelowTwoByFour"
equation "\"d49\" = baseBelowTwoByFour"
equation "\"centerForTwoHoles\" = 0.25 * diagonalLine"
equation "\"d62\" = centerForTwoHoles"
equation "\"d63\" = centerForTwoHoles"
equation "\"d98\" = wallThickness"
equation "\"d99\" = wallThickness"
equation "\"d101\" = wallThickness"
equation "\"d102\" = wallThickness"
equation "\"d105\" = wallThickness"
equation "\"d107\" = wallThickness"
equation "\"d108\" = 2 * wallThickness"
equation "\"d109\" = wallThickness"
equation "\"d112\" = wallThickness"
equation "\"d113\" = 2 * wallThickness"
equation "\"d114\" = wallThickness"
equation "\"d115\" = wallThickness"
equation "\"d185\" = depthOfExtrusionForMatingUpperHalf"
equation "\"wallThickness\" = 8"
equation "\"widthOfBracket\" = 80"
equation "\"twoByFourWidth\" = 40.64"
equation "\"twoByFourDepth\" = 84.1375"
equation "\"azimuth\" = -15deg"
equation "\"elevation\" = 40deg"
equation "\"baseBelowTwoByFour\" = 20"
equation "\"depthOfExtrusionForMatingUpperHalf\" = 12.5"
equation "\"topWallThickness\" = 12.7"
properties part number "bracketForGarageLowerHalf" material "PC/ABS Plastic"
